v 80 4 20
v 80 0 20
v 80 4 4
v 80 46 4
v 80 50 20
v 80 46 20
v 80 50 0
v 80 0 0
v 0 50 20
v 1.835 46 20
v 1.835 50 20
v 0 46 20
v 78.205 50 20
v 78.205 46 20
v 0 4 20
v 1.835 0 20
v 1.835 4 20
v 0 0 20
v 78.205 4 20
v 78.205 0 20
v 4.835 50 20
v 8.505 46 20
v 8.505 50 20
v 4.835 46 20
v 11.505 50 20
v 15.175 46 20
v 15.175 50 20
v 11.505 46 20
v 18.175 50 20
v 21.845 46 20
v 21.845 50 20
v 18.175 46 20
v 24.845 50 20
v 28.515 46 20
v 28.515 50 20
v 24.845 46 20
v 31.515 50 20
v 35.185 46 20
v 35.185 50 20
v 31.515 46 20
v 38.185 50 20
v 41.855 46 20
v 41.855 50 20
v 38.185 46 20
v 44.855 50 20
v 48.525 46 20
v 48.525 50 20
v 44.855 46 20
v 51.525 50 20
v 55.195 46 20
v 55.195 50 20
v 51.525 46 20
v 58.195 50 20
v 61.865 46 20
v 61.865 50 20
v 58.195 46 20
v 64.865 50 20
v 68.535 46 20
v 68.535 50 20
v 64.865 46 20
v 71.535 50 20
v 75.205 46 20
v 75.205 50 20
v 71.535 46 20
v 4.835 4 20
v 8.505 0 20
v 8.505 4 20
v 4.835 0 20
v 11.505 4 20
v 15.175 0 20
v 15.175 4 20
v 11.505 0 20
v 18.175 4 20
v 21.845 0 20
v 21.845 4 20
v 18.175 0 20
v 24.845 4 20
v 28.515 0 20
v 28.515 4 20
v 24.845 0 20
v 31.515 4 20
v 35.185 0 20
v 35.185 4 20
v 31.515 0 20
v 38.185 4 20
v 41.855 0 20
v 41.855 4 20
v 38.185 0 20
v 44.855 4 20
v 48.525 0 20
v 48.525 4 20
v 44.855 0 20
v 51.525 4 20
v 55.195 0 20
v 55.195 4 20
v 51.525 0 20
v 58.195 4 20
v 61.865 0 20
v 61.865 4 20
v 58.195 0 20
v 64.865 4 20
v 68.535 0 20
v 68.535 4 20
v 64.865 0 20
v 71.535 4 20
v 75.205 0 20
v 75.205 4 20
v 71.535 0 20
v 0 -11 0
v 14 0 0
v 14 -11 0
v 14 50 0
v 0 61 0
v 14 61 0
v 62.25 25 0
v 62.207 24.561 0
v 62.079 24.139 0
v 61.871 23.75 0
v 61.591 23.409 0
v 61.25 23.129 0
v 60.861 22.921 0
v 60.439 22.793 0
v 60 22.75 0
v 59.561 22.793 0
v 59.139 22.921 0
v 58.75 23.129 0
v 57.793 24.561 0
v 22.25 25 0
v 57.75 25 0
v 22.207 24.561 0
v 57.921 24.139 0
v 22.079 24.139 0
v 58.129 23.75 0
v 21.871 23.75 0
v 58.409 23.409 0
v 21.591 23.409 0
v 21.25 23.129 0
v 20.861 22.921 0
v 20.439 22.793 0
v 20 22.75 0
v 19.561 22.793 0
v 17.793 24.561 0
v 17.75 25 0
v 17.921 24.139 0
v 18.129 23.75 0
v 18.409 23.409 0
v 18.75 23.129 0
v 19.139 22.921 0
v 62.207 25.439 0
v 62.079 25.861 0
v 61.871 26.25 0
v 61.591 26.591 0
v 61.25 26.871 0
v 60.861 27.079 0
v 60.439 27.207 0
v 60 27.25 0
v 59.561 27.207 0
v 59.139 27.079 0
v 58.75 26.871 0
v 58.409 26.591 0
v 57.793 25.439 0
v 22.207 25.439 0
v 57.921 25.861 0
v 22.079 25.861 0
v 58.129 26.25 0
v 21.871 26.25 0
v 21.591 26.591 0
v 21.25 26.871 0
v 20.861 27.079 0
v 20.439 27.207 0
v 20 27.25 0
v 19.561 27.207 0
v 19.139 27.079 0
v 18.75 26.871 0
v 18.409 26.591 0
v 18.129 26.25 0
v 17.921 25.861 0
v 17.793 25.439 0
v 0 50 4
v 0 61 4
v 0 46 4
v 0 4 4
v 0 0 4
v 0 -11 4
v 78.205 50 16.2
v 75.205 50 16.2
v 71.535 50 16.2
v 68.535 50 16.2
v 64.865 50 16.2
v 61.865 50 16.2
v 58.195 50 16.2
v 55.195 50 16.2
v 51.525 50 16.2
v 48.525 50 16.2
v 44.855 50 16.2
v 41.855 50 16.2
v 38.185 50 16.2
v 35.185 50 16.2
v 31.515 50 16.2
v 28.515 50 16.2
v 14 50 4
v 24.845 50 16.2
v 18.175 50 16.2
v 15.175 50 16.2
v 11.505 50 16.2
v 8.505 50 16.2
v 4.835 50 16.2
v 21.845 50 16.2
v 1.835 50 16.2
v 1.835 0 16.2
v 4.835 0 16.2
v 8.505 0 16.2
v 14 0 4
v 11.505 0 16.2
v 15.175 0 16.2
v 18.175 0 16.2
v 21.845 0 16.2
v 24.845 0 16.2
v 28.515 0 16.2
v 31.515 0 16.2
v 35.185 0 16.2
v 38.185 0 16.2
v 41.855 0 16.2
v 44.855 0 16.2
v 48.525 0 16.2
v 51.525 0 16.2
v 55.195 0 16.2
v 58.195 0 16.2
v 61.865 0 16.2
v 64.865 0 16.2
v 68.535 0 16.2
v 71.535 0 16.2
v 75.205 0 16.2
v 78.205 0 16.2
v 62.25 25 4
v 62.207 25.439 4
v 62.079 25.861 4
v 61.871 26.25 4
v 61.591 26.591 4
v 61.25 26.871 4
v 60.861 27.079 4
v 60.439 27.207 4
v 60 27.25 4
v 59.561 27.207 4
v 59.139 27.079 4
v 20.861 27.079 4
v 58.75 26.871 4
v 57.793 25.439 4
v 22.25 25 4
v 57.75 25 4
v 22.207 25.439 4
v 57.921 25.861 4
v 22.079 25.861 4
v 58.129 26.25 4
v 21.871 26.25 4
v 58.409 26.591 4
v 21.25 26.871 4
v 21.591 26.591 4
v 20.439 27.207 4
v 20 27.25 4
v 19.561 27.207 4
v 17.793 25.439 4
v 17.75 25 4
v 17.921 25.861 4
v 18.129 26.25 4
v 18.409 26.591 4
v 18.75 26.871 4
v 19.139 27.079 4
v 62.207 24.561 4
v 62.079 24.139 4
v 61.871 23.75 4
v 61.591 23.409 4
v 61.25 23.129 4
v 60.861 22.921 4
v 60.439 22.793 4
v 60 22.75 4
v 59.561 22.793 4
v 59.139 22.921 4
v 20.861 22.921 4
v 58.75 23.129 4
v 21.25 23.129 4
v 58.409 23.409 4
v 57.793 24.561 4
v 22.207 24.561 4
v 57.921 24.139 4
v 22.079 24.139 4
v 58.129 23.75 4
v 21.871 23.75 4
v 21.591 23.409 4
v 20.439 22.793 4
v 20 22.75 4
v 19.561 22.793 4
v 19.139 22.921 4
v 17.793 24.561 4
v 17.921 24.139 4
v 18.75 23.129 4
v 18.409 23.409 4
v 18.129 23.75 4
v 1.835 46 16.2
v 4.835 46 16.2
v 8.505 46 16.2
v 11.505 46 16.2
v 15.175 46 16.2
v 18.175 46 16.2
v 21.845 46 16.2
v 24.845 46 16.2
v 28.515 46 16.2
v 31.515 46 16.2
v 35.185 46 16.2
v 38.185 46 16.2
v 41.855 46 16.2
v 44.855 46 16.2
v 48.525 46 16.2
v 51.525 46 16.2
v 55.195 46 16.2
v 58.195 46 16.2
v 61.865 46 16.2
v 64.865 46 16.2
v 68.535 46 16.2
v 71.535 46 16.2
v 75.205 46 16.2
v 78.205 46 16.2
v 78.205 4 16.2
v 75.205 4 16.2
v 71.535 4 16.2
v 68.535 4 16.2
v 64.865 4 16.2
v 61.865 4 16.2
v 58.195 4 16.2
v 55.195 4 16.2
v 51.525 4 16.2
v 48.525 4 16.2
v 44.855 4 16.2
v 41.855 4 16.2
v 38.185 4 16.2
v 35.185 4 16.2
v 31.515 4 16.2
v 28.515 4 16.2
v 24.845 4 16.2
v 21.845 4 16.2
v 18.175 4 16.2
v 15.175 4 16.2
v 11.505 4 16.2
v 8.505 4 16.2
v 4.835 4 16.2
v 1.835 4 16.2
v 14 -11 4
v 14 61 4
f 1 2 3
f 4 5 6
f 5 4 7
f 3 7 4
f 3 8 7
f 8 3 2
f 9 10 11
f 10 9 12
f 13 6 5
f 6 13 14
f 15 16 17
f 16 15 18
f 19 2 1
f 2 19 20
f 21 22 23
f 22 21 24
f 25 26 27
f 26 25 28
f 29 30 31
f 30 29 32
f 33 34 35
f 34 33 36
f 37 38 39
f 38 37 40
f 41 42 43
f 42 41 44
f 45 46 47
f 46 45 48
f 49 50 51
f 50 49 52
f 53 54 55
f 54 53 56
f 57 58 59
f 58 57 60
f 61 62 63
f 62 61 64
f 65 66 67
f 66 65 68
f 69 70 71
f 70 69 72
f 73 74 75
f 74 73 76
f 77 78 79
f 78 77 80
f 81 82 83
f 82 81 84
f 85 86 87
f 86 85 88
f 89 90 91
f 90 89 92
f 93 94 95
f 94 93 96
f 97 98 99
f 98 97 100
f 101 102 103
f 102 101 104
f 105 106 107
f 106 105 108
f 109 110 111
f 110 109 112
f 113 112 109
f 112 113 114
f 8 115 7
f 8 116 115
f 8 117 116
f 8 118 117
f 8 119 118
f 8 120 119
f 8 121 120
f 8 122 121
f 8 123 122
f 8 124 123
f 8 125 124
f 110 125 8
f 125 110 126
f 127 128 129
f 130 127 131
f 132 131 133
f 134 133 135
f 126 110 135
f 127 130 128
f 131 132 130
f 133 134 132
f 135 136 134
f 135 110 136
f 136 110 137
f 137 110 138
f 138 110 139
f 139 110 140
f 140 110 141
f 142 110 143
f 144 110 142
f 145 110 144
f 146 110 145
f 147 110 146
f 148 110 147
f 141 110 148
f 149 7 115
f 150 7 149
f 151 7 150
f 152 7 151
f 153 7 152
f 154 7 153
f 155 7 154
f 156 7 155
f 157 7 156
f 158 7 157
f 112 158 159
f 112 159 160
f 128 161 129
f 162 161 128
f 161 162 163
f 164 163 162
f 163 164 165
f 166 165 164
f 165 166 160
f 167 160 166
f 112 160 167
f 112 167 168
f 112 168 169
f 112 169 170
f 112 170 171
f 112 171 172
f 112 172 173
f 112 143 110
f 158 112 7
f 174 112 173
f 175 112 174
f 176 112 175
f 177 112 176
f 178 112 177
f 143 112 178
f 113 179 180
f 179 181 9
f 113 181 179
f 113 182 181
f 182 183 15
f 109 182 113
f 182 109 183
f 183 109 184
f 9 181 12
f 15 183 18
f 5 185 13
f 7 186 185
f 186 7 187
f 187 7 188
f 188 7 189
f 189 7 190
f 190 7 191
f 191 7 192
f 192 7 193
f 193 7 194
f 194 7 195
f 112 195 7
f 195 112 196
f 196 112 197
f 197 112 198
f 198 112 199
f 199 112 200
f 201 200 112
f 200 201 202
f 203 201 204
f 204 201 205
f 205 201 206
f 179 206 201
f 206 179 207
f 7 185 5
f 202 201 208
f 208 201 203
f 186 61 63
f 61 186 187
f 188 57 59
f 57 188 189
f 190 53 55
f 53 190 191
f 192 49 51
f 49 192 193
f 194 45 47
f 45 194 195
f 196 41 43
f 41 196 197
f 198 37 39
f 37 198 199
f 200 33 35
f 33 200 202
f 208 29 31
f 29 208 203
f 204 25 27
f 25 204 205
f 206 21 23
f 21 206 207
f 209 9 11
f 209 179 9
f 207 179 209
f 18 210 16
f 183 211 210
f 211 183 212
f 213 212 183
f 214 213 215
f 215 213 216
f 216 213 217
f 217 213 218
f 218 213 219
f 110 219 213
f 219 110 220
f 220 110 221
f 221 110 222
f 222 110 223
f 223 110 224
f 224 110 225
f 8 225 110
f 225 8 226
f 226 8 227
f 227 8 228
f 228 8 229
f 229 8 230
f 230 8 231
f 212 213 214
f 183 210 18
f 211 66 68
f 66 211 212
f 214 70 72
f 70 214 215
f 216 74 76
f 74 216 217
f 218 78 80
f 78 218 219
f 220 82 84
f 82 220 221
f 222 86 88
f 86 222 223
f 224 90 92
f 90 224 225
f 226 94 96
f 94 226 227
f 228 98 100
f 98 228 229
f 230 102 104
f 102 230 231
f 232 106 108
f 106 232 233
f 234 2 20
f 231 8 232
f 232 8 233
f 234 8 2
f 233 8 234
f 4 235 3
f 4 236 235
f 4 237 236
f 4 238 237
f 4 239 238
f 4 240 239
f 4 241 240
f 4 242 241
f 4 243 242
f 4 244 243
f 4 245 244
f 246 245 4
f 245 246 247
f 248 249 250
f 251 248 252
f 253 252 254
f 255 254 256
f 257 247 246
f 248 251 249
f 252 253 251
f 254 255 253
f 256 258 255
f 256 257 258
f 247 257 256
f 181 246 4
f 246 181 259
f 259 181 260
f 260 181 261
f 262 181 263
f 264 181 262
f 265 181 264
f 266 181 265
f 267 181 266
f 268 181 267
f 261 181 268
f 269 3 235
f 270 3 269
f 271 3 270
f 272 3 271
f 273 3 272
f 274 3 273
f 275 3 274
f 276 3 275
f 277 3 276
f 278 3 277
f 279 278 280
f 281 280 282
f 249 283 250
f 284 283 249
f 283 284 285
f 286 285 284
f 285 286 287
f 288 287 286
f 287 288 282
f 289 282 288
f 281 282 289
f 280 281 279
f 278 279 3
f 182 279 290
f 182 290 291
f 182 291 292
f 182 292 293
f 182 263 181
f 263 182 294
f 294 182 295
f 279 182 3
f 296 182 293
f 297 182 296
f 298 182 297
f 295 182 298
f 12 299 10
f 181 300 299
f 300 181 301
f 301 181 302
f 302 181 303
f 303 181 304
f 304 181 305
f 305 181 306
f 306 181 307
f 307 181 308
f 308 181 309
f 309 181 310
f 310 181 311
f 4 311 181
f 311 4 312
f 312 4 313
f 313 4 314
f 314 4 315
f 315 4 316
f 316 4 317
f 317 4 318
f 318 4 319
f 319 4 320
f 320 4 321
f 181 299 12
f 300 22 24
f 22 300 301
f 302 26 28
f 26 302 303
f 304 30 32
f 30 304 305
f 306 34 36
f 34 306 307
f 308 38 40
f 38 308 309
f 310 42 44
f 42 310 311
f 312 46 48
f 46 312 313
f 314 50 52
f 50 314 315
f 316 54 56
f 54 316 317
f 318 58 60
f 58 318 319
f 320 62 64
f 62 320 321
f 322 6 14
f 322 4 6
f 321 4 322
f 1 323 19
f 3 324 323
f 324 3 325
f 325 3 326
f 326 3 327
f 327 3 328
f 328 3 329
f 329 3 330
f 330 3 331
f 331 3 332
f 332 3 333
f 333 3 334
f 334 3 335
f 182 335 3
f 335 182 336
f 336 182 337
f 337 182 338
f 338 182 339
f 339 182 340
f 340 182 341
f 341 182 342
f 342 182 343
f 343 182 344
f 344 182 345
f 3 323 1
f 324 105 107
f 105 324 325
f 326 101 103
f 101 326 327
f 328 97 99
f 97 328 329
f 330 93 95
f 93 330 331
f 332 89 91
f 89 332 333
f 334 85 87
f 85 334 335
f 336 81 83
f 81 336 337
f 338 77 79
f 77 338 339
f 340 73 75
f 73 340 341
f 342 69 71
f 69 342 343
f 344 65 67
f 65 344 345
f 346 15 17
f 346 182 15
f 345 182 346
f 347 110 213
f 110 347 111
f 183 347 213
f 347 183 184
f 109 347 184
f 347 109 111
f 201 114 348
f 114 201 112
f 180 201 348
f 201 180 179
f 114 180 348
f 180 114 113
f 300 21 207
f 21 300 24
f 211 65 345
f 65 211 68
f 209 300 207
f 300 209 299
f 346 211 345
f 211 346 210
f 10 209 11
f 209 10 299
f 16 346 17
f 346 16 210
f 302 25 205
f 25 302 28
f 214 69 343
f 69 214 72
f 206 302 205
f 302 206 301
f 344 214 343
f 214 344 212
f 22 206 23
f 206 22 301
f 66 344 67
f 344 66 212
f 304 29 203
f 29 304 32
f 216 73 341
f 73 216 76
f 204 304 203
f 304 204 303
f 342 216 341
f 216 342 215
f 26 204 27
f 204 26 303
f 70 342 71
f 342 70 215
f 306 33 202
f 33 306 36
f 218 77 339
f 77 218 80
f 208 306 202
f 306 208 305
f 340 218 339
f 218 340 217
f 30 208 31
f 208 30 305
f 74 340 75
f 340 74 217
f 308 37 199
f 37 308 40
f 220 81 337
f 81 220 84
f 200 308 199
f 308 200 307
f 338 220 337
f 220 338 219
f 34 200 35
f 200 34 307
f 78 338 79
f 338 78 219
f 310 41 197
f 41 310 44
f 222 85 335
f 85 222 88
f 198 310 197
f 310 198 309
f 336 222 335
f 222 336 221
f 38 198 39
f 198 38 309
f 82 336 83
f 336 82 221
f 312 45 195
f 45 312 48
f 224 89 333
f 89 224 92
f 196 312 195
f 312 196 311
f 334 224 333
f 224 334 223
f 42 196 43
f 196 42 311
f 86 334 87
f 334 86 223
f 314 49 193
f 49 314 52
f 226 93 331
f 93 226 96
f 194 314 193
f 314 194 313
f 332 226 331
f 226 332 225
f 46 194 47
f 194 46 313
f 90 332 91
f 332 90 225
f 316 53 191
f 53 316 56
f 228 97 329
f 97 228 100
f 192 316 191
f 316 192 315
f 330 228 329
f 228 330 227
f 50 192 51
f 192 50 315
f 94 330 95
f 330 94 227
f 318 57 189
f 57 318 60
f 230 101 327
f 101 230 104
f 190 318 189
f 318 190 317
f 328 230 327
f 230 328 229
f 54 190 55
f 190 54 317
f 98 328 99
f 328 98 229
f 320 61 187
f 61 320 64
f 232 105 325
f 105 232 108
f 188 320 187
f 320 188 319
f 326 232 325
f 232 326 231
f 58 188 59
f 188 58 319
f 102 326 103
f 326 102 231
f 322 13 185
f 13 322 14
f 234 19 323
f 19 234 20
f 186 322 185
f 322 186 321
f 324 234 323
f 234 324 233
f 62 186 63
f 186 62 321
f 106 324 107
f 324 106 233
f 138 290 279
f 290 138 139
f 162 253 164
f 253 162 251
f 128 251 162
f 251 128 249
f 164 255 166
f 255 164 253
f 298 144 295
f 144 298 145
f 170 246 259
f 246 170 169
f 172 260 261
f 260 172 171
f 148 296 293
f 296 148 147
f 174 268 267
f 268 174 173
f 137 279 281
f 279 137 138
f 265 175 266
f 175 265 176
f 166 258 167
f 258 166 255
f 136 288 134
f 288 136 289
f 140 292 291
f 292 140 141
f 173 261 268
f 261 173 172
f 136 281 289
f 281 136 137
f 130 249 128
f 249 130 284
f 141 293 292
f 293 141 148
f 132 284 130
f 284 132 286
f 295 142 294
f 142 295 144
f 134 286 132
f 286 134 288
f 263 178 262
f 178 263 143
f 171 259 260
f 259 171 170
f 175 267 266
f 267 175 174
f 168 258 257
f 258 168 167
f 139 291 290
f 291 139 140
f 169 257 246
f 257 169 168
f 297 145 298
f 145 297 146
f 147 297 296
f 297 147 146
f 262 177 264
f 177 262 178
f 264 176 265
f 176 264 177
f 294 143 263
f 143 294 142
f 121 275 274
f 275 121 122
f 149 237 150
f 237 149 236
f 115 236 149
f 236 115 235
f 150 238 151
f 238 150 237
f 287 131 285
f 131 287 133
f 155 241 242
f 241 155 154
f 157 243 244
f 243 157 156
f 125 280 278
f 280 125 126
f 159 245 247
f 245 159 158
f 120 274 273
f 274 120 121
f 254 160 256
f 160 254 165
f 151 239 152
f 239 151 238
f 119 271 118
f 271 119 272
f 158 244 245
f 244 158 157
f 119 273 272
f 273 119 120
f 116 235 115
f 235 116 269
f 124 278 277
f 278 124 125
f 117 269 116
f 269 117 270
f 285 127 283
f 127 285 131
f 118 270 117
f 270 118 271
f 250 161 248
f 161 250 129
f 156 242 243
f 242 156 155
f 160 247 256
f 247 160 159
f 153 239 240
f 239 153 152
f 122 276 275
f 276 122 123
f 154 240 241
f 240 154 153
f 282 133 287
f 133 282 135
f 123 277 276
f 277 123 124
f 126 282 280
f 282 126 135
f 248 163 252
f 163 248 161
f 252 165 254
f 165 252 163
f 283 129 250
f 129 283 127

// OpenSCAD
$fn = 32;

// ----------------------------------------------------------------------
// Cable duct: 80 x 50 x 20 mm, 12 fingers
// ----------------------------------------------------------------------

// --- parameters (mm) ---
duct_len = 80;            // duct length, X
duct_w = 50;              // duct width, Y
duct_h = 20;              // duct height, Z
wall_t = 4;               // side wall thickness
floor_t = 4;              // floor thickness
slot_w = 3;               // finger slot width
slot_h = 12.2;            // finger slot height
fingers = 12;             // number of finger slots per side
pitch = 6.67;             // finger pitch
hole_d = 4.5;             // floor mounting hole
hole_n = 2;               // mounting holes in the floor
ear_w = 12;               // mounting ear width
ear_l = 14;               // mounting ear length

module shell() {
  difference() {
    cube([duct_len, duct_w, duct_h]);
    /* open top channel */
    translate([-wall_t - 1, wall_t, floor_t])
      cube([duct_len + 2 * wall_t + 2, duct_w - 2 * wall_t, duct_h + 1]);
  }
}

module ears() {
  translate([0, -ear_w + 1, 0]) cube([ear_l, ear_w, floor_t]);
  translate([0, duct_w - 1, 0]) cube([ear_l, ear_w, floor_t]);
}

difference() {
  union() {
    shell();
    ears();
  }
  /* finger slots cut through both side walls */
  for (i = [0 : fingers - 1]) translate([pitch / 2 + i * pitch - slot_w / 2, -1, floor_t + slot_h]) cube([slot_w, duct_w + 2, duct_h]);
  for (i = [0 : hole_n - 1]) translate([(duct_len / hole_n) * (i + 0.5), duct_w / 2, -1]) cylinder(h = floor_t + 2, d = hole_d);
}
